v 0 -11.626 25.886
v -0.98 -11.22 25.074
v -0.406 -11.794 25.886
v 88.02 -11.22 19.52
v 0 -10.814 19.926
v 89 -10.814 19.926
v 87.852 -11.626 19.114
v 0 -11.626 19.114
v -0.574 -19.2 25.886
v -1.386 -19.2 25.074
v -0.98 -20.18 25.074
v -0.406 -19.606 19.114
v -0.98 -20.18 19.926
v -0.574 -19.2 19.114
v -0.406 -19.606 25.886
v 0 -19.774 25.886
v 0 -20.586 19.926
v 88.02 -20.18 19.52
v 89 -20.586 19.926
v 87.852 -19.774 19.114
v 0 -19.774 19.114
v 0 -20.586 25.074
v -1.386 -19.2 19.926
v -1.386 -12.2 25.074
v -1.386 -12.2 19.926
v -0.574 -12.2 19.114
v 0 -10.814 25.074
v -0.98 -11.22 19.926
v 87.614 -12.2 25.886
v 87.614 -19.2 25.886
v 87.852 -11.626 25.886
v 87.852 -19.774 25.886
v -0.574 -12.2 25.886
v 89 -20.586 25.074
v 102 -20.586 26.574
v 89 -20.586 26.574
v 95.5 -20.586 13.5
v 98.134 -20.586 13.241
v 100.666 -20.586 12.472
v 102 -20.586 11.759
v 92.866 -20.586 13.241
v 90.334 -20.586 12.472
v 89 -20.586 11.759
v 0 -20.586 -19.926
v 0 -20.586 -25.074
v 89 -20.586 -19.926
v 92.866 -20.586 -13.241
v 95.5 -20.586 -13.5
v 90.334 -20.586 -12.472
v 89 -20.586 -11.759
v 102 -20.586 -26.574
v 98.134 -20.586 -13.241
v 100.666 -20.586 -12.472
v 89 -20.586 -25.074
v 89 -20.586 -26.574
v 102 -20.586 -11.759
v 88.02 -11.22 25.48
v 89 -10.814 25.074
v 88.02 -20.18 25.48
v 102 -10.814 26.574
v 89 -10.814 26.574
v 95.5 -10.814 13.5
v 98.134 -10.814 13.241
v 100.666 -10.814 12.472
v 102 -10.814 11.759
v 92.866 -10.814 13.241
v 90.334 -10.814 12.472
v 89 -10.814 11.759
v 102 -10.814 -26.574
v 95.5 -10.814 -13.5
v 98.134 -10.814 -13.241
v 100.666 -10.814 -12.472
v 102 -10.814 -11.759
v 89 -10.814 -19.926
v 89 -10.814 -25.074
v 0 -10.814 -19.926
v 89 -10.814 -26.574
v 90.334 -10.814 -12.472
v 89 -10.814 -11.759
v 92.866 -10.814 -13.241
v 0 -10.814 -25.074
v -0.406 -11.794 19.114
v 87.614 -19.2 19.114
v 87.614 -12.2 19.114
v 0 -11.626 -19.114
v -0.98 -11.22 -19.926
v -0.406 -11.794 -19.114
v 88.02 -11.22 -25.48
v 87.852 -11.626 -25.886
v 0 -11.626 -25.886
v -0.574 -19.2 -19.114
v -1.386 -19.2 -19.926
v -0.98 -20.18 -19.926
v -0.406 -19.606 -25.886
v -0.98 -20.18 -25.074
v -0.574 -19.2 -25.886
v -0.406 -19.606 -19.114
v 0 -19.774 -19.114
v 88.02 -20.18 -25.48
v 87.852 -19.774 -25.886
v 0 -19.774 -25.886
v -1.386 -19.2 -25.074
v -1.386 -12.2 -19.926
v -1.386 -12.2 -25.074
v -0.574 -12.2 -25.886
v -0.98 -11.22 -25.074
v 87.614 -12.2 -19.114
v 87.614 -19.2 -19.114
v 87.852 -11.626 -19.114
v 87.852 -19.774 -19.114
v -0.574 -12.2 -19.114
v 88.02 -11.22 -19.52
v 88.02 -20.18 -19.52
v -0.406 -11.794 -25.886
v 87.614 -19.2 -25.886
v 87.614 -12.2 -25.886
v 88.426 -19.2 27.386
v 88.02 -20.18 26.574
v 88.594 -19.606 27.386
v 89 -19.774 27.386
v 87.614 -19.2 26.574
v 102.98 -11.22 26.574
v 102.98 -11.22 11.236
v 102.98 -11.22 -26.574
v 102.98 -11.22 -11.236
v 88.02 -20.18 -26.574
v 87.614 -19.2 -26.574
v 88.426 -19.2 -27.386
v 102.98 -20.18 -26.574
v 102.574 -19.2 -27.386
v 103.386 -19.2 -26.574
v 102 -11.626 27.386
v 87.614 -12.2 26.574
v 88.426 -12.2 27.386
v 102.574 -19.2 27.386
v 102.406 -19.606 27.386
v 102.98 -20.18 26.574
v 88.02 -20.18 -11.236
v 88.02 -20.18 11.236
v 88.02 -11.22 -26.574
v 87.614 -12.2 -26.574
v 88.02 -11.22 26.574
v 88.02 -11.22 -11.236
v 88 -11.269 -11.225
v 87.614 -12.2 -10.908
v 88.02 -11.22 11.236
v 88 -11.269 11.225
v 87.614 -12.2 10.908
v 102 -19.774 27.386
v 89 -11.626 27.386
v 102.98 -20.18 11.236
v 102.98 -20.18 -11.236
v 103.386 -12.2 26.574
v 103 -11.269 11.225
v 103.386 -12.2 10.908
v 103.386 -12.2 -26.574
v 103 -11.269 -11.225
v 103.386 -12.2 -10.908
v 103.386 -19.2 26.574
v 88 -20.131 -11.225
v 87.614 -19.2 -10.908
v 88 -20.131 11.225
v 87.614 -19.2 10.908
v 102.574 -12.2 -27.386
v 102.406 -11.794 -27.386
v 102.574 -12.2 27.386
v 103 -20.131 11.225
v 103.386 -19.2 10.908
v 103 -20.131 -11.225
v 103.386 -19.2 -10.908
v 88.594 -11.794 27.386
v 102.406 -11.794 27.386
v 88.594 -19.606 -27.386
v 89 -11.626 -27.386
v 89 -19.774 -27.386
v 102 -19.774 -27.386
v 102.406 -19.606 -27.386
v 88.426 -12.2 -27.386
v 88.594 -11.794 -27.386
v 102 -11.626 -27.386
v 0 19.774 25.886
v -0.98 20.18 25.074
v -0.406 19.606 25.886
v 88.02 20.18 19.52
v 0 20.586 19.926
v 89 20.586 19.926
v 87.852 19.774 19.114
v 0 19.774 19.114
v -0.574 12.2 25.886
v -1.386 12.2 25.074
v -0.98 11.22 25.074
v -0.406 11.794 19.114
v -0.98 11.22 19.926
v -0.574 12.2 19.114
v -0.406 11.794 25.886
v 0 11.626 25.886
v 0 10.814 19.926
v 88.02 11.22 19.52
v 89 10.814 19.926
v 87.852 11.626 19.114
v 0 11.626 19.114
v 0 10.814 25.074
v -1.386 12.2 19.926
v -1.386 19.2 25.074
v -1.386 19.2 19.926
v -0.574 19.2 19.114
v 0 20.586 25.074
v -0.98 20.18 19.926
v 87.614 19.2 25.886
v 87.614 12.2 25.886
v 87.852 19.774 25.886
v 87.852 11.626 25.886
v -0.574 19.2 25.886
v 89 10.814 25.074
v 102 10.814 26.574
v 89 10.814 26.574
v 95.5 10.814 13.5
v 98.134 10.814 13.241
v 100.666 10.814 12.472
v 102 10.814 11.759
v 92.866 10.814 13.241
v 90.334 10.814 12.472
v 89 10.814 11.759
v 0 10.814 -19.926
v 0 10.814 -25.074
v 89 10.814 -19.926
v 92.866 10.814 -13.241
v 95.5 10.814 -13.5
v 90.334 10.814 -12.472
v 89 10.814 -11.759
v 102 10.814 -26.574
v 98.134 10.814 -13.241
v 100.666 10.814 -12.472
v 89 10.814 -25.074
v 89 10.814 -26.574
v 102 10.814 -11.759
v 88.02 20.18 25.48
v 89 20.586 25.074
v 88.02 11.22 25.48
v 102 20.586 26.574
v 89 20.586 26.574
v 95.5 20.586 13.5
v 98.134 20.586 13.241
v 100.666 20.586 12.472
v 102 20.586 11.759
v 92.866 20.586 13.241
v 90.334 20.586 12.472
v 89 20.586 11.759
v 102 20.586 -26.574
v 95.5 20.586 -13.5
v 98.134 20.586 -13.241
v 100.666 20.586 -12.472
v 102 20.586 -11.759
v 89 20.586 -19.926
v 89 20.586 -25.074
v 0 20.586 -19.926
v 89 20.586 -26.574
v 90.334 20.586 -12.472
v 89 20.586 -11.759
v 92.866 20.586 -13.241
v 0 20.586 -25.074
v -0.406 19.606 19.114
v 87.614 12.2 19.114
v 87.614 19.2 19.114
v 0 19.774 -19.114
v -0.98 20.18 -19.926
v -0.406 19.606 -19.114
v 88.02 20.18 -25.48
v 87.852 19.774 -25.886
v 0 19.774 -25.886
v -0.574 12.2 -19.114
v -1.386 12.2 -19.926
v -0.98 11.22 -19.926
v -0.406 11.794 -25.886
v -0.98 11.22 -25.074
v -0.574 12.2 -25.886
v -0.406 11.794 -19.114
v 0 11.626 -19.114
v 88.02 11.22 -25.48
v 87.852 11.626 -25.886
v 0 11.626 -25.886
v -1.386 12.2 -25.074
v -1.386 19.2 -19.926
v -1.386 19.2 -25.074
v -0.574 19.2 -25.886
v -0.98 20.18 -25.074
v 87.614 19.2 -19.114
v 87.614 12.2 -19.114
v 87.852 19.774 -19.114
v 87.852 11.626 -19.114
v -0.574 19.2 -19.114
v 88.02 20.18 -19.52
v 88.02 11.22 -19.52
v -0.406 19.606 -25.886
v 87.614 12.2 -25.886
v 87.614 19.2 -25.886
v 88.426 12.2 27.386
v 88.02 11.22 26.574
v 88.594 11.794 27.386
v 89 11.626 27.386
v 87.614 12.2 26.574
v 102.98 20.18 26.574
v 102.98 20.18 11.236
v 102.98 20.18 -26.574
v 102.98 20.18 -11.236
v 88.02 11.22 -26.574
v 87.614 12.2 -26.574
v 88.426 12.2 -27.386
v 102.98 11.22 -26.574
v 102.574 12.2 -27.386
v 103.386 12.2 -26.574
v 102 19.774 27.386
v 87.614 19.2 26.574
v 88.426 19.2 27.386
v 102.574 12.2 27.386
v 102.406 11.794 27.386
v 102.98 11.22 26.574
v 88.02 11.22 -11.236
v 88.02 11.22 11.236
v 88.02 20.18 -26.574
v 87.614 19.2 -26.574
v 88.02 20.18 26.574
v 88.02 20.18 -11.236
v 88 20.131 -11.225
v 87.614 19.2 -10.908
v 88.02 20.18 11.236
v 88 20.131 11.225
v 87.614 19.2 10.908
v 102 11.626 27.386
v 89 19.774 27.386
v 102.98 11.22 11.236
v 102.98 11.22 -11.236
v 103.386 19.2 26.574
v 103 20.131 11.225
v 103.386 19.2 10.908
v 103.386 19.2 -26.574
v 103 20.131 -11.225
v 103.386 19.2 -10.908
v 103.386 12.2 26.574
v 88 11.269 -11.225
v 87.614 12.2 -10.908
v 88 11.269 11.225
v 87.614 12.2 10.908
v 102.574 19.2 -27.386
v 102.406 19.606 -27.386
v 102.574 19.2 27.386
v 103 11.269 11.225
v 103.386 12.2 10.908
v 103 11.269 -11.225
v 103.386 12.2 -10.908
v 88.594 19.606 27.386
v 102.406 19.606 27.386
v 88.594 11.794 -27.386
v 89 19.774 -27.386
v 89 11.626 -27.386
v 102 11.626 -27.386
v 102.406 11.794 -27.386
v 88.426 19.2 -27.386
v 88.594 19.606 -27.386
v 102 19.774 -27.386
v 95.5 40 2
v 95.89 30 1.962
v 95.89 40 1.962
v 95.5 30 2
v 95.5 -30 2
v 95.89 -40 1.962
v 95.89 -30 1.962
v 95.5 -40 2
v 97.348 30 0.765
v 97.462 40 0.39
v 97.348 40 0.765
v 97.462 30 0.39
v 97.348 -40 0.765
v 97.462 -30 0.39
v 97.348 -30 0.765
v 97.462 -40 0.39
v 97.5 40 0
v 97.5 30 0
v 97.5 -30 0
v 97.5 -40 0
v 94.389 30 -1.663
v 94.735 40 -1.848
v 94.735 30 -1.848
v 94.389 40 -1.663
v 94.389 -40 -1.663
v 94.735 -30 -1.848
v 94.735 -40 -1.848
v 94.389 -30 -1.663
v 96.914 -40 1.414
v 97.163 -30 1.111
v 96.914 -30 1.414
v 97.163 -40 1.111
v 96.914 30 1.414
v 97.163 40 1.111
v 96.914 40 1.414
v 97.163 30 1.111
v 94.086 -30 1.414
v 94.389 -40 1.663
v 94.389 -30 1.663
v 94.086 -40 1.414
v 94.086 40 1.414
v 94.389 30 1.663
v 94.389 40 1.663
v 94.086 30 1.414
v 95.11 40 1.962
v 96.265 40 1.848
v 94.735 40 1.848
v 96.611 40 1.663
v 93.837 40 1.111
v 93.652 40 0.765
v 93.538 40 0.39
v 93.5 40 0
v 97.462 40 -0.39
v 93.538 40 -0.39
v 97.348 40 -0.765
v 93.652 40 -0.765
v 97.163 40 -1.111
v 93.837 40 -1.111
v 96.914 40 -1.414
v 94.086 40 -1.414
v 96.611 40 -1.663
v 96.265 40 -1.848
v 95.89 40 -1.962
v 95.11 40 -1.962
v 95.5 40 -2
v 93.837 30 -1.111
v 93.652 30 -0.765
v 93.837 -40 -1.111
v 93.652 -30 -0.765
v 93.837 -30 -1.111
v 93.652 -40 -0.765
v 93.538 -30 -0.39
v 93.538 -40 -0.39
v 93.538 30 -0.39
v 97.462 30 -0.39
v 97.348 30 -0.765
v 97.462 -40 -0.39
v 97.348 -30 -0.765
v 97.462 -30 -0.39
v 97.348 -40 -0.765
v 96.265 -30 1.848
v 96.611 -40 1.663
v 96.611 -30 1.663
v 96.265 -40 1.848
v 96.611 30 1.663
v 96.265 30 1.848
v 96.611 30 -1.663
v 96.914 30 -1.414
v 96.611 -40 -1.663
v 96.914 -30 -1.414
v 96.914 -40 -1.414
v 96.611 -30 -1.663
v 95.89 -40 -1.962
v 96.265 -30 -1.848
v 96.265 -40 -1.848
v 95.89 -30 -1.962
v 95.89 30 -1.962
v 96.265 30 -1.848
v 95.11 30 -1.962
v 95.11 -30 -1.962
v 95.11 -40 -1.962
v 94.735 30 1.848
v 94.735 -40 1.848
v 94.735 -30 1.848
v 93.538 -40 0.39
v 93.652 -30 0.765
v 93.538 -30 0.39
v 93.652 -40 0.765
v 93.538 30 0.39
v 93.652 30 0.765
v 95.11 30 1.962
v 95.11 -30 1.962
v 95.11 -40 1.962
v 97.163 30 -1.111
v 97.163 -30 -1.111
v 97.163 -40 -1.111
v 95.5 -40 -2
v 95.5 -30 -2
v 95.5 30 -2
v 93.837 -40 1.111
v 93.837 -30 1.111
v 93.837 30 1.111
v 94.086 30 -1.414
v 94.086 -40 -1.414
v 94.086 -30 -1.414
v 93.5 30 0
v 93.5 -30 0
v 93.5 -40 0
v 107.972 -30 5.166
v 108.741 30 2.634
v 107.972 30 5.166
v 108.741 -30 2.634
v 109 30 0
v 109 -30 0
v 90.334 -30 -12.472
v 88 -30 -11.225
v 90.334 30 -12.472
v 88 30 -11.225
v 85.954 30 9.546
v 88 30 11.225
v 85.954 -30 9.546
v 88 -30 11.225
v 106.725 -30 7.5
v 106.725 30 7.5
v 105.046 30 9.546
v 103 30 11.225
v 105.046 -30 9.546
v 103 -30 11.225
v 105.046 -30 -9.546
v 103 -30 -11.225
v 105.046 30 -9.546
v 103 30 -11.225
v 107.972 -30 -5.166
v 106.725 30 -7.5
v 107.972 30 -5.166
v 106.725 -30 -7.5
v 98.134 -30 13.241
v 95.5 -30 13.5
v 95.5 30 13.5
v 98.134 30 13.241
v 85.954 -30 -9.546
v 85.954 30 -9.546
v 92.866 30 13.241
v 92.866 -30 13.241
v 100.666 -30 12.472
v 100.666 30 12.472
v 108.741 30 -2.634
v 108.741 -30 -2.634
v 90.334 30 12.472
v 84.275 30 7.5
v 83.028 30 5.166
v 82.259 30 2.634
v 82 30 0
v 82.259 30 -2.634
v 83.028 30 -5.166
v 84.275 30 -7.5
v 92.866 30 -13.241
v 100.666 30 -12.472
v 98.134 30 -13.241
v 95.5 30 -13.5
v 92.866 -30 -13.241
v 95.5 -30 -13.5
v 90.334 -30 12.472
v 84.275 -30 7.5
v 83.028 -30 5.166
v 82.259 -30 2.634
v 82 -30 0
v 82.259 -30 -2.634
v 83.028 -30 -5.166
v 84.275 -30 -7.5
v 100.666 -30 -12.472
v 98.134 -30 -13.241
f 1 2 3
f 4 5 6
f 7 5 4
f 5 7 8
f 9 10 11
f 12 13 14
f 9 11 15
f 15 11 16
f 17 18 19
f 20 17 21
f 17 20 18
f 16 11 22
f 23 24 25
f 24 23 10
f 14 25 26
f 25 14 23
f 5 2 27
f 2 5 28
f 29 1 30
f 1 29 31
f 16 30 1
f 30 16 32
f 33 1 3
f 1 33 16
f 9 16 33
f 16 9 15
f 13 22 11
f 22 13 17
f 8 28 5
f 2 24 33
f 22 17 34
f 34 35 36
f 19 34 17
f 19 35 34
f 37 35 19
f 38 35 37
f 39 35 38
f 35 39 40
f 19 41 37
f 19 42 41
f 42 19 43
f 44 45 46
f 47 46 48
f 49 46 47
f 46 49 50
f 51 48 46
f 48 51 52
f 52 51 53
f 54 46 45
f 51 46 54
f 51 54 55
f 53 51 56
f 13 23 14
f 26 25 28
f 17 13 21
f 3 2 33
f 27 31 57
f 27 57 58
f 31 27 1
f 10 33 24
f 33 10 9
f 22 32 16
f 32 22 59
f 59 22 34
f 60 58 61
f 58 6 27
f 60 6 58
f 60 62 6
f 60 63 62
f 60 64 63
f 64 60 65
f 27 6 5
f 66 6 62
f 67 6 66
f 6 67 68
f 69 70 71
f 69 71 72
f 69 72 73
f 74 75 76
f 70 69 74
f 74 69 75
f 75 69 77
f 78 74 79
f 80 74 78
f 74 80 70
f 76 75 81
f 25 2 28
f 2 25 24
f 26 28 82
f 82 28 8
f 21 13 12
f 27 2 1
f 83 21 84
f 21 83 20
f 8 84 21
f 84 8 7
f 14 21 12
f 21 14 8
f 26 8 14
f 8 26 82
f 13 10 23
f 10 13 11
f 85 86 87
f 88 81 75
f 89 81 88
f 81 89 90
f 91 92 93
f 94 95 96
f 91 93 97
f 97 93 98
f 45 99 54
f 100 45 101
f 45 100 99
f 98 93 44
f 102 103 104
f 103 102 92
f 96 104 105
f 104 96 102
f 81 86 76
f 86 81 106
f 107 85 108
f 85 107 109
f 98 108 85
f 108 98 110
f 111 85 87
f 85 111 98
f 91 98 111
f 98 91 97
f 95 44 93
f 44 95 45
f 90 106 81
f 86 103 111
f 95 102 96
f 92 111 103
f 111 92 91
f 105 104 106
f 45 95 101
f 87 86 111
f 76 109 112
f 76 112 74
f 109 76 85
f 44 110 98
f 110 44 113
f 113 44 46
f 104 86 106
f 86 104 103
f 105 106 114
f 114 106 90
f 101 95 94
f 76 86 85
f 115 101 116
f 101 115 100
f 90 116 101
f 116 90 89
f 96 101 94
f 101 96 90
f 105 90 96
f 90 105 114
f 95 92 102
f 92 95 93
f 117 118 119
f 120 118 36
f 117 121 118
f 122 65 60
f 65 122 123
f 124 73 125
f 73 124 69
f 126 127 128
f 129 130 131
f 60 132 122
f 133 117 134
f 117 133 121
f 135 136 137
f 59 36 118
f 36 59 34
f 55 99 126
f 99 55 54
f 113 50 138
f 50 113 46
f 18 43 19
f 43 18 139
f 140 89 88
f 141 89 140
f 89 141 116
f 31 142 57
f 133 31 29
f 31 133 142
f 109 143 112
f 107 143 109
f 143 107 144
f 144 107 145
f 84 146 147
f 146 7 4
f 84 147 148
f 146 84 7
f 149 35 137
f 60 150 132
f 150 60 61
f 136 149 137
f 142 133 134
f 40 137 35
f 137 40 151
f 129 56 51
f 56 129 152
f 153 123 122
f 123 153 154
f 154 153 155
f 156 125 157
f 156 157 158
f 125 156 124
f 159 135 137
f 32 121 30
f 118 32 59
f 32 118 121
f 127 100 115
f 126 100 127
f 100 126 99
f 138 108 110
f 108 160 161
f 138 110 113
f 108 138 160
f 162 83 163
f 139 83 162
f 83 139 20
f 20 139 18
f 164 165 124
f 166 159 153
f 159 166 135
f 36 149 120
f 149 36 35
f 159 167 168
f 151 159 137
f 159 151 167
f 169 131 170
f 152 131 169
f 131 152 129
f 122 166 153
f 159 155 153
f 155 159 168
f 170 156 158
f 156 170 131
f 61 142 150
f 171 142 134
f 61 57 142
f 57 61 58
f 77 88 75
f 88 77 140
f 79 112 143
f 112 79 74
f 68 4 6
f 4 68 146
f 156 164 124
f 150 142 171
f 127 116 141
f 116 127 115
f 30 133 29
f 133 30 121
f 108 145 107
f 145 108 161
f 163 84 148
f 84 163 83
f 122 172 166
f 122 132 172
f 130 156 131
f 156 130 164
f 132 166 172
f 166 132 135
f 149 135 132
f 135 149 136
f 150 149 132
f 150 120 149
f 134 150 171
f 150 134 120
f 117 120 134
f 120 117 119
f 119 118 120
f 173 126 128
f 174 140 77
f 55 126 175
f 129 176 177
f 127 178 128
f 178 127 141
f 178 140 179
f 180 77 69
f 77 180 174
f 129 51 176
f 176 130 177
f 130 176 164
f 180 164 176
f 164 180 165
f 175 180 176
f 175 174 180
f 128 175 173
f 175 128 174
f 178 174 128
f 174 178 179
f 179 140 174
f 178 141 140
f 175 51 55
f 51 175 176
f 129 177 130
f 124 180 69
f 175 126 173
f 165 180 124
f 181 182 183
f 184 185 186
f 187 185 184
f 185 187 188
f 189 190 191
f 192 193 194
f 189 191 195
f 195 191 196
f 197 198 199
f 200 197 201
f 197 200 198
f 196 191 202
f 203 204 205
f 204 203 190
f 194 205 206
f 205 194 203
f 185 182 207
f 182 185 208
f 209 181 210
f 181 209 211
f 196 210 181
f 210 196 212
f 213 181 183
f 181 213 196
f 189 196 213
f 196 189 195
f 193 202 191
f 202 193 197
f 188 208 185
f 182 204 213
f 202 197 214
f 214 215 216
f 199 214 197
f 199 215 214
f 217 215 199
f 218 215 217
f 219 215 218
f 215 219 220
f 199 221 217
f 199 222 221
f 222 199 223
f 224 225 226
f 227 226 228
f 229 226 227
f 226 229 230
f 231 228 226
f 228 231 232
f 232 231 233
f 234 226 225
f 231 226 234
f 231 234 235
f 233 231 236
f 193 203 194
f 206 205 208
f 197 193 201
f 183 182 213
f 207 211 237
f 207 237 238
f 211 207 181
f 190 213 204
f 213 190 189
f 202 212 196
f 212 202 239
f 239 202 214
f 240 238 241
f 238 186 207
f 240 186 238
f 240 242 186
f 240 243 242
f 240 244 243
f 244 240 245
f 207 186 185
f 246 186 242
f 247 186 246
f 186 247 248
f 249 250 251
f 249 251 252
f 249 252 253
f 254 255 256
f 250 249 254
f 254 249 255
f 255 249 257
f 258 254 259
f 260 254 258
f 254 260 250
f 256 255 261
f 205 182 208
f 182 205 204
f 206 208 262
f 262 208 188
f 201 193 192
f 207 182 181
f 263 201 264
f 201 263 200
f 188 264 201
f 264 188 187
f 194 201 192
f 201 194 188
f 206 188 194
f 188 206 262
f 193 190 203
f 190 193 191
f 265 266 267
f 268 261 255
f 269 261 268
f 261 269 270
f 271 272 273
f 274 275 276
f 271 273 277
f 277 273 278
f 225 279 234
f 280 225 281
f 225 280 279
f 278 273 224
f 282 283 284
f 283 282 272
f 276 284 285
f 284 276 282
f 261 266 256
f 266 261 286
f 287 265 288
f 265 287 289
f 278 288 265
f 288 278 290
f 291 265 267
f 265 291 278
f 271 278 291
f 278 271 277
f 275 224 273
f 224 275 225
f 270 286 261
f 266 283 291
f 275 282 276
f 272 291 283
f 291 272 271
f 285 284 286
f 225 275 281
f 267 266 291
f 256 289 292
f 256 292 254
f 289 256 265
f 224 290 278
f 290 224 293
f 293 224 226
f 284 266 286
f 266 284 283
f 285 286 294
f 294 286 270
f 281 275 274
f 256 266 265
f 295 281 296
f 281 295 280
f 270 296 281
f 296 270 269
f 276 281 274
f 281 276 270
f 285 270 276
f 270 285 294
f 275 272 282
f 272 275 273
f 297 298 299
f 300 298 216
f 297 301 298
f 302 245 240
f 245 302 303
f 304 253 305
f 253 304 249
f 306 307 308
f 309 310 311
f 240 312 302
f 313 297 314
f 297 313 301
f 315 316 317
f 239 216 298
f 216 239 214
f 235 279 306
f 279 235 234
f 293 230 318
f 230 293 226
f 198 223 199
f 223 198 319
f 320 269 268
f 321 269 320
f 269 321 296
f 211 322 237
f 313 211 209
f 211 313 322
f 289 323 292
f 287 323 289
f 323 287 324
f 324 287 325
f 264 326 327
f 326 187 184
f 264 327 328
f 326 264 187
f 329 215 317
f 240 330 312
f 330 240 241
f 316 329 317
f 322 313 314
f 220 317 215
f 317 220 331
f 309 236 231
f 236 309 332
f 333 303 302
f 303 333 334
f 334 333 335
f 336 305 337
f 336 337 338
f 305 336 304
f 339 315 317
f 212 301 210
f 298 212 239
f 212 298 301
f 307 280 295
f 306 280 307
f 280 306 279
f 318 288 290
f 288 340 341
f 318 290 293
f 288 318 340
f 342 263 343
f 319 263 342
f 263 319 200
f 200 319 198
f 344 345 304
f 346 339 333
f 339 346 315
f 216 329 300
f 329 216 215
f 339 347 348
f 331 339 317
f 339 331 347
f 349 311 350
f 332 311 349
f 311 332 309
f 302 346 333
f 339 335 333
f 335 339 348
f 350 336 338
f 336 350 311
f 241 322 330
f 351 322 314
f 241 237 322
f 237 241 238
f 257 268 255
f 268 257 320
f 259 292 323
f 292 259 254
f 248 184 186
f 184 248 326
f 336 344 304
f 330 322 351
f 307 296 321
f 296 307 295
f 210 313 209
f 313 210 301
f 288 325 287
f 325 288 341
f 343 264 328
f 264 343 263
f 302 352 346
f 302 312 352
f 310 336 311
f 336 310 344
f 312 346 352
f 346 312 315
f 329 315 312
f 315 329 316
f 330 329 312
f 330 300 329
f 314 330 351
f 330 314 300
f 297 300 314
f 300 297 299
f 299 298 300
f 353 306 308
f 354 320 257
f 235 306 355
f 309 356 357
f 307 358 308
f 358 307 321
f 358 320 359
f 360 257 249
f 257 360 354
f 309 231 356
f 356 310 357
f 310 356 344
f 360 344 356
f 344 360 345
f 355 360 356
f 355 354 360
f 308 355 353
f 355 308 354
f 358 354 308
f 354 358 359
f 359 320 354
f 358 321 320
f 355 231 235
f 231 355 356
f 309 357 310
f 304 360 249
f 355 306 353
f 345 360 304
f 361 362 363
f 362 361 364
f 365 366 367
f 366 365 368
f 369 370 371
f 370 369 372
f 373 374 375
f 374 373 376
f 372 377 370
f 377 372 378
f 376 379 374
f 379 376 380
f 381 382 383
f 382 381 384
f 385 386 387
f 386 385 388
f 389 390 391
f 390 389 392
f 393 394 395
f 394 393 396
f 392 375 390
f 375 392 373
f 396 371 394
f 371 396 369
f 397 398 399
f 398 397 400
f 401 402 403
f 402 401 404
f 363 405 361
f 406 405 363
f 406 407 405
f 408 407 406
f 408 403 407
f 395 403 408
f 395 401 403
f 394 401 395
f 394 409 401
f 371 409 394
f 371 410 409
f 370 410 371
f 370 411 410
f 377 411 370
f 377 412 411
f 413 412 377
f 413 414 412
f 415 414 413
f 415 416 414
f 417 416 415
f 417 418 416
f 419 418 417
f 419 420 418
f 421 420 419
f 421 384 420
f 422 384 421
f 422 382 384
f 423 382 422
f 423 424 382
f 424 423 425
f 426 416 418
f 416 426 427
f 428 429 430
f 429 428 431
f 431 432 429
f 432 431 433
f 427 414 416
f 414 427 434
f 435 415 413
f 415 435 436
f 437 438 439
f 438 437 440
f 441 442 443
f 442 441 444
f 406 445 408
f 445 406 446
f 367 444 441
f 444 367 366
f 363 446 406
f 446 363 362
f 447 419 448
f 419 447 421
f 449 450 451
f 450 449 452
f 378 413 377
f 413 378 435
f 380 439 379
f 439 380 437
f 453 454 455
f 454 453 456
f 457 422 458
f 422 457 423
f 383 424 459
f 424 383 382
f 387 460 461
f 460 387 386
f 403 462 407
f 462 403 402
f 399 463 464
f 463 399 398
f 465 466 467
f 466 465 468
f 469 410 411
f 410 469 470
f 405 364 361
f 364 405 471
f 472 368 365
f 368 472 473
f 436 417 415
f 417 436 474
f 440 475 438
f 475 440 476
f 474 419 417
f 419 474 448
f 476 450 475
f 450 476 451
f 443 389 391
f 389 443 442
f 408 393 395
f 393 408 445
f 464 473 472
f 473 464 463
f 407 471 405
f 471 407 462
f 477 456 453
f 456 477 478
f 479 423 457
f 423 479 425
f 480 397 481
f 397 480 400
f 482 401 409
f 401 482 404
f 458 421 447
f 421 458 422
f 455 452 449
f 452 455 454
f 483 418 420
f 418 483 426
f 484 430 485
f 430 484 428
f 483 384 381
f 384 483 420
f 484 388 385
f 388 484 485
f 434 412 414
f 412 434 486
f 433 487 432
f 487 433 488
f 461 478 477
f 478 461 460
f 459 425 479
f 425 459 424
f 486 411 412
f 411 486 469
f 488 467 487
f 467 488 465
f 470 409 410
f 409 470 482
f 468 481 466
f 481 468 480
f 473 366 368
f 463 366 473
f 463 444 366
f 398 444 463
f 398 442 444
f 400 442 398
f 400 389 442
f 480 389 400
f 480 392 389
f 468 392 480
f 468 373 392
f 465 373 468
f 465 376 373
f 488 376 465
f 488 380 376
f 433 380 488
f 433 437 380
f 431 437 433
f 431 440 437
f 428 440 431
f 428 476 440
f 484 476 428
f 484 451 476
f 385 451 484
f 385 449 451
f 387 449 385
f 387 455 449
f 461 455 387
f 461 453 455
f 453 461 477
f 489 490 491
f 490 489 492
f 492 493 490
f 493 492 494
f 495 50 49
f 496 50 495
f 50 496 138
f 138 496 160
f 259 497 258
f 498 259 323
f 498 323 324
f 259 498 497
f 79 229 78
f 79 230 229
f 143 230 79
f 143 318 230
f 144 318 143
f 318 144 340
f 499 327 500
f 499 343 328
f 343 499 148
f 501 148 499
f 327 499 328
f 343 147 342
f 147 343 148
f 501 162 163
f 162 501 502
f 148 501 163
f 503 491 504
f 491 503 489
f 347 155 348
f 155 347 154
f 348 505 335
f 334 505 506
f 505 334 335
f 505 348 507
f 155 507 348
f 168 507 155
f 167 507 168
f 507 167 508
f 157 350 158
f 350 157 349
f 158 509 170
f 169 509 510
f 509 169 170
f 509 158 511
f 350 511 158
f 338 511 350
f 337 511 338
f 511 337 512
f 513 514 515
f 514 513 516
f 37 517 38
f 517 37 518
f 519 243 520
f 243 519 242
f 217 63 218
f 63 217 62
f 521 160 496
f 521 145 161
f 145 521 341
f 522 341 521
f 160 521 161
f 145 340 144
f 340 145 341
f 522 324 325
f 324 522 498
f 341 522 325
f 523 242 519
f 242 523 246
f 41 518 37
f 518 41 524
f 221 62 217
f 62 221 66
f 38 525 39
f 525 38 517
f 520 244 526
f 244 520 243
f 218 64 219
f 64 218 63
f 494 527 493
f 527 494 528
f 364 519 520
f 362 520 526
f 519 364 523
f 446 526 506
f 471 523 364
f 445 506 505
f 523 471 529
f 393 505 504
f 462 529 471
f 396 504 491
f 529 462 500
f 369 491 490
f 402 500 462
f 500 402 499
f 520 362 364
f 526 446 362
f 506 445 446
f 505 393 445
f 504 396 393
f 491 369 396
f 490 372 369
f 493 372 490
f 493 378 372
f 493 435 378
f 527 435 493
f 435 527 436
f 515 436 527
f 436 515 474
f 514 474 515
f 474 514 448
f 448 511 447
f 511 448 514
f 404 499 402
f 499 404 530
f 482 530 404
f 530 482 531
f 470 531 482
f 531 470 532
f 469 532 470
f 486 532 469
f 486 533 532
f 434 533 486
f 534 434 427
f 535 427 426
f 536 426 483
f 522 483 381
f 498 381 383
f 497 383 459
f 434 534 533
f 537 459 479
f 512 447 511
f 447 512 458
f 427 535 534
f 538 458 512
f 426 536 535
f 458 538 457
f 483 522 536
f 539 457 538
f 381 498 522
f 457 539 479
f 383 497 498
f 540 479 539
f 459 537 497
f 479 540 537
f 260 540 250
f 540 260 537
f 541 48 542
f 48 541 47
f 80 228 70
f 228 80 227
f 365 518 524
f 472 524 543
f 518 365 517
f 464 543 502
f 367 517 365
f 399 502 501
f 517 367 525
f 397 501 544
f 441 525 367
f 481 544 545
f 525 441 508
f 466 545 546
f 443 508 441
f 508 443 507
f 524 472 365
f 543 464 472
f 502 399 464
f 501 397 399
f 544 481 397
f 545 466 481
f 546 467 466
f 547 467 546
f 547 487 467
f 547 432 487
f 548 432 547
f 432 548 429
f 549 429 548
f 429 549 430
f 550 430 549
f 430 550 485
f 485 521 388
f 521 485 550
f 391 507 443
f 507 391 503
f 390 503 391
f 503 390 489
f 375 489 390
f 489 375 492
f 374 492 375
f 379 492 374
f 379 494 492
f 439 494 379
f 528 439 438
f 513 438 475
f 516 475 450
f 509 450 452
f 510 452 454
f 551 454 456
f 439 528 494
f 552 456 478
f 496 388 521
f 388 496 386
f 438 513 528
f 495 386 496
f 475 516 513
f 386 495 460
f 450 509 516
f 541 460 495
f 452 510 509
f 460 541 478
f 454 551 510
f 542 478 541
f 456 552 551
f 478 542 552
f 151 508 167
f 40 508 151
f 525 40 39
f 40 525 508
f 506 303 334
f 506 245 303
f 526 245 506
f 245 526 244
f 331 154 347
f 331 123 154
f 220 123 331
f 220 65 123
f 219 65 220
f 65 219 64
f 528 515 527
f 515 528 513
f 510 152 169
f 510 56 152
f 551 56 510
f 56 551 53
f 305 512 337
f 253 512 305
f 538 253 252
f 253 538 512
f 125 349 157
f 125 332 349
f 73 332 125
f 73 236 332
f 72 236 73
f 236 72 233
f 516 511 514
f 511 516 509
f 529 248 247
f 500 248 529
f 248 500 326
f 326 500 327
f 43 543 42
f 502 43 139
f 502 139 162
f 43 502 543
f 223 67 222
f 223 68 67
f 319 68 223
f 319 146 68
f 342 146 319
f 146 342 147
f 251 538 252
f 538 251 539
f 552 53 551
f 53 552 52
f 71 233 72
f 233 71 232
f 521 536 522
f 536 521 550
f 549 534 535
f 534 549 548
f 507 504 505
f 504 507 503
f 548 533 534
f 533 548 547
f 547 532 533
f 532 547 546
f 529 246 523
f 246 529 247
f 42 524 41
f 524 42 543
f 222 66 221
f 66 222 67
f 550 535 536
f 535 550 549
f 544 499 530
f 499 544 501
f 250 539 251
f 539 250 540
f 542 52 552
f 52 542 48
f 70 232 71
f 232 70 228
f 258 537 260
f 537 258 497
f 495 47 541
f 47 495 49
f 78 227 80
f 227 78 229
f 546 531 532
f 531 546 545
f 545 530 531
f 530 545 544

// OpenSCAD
// =========================================================
// CARRIER TEST — C-channel arms with solid bridge block
// =========================================================
// One corridor = two C-shaped members facing each other.
// Each C-member: upper arm → solid bridge block → lower arm.
// The bridge is one continuous block from upper arm outer face
// to lower arm outer face. Bearing housing is part of the block.
// No gussets — one clean solid.
// =========================================================

$fn = 32;

// =============================================
// PARAMETERS
// =============================================

// Arm cross-section
ARM_W       = 10;     // width (along shaft axis / Y)
ARM_H       = 7;      // height (vertical / Z)
ARM_CHAMFER = 1.5;

// Tier Z positions
UPPER_Z     = 22.5;
LOWER_Z     = -22.5;
HELIX_Z     = 0;

// Bearing — MR84ZZ
BRG_OD      = 8.0;
BRG_ID      = 4.0;
BRG_W       = 3.0;
BRG_BORE    = 8.15;

// Corridor
CORRIDOR_GAP = 31.4;
ARM_LENGTH   = 100;

// Shaft
SHAFT_DIA    = 4.0;
SHAFT_LEN    = 80;

// Bridge block — one solid piece
// Width (Y) = ARM_W (flush with arms)
// Height (Z) = upper arm outer face to lower arm outer face
// Depth (X) = enough to house bearing with wall all around
HOUSING_WALL  = 4.0;
BRIDGE_D      = BRG_OD + HOUSING_WALL * 2;   // 16mm depth along X
BRIDGE_Z_TOP  = UPPER_Z + ARM_H / 2;         // upper arm outer face
BRIDGE_Z_BOT  = LOWER_Z - ARM_H / 2;         // lower arm outer face
BRIDGE_H      = BRIDGE_Z_TOP - BRIDGE_Z_BOT; // full span

// =============================================
// COLORS
// =============================================
C_ARM     = [0.9, 0.4, 0.9, 0.9];
C_BEARING = [0.5, 0.5, 0.55, 0.8];
C_SHAFT   = [0.7, 0.7, 0.75, 0.9];
C_GHOST   = [0.3, 0.6, 0.9, 0.15];

// =============================================
// DISPLAY TOGGLES
// =============================================
SHOW_SHAFT     = true;
SHOW_BEARING   = true;
SHOW_GHOST_CAM = true;

// =============================================
// ASSEMBLY
// =============================================

// Left C-member
translate([0, -CORRIDOR_GAP/2, 0])
    c_member();

// Right C-member
translate([0, CORRIDOR_GAP/2, 0])
    c_member();

// Bridge center X (housing bore center)
_BRG_CX = ARM_LENGTH - (BRIDGE_D - ARM_H) / 2;

// Shaft
if (SHOW_SHAFT)
    color(C_SHAFT)
    translate([_BRG_CX, 0, HELIX_Z])
        rotate([90, 0, 0])
            cylinder(d=SHAFT_DIA, h=SHAFT_LEN, center=true);

// Bearings
if (SHOW_BEARING)
    for (y_sign = [-1, 1])
        color(C_BEARING)
        translate([_BRG_CX, y_sign * CORRIDOR_GAP/2, HELIX_Z])
            rotate([90, 0, 0])
                difference() {
                    cylinder(d=BRG_OD, h=BRG_W, center=true);
                    cylinder(d=BRG_ID, h=BRG_W+1, center=true);
                }

// Ghost cam
if (SHOW_GHOST_CAM)
    color(C_GHOST)
    translate([_BRG_CX, 0, HELIX_Z])
        rotate([90, 0, 0])
            cylinder(d=27, h=60, center=true);


// =============================================
// C-MEMBER: upper arm → bridge block → lower arm
// =============================================
module c_member() {
    // Bridge block X span
    _bx_inner = ARM_LENGTH - BRIDGE_D + ARM_H/2;  // inboard face
    _bx_outer = ARM_LENGTH + ARM_H/2;              // outboard face (flush with arm tip)

    color(C_ARM)
    difference() {
        union() {
            // === UPPER ARM ===
            _arm_bar([0, 0, UPPER_Z], [ARM_LENGTH, 0, UPPER_Z]);

            // === LOWER ARM ===
            _arm_bar([0, 0, LOWER_Z], [ARM_LENGTH, 0, LOWER_Z]);

            // === BRIDGE BLOCK — one continuous solid ===
            // BRIDGE_D deep (X), ARM_W wide (Y), full tier height (Z).
            // Centered so outer face aligns with arm end.
            _bridge_block();
        }

        // === BEARING BORE — through-hole ===
        translate([_BRG_CX, 0, HELIX_Z])
            rotate([90, 0, 0])
                cylinder(d=BRG_BORE, h=ARM_W + 4, center=true);

        // === SHAFT CLEARANCE ===
        translate([_BRG_CX, 0, HELIX_Z])
            rotate([90, 0, 0])
                cylinder(d=SHAFT_DIA + 1, h=200, center=true);
    }
}


// =============================================
// BRIDGE BLOCK — one solid from top to bottom
// =============================================
module _bridge_block() {
    _cx = ARM_LENGTH - (BRIDGE_D - ARM_H) / 2;
    _c = ARM_CHAMFER;

    // One hull from top to bottom — simple chamfered box
    hull() {
        translate([_cx, 0, BRIDGE_Z_TOP])
            _block_profile();
        translate([_cx, 0, BRIDGE_Z_BOT])
            _block_profile();
    }
}

// Block cross-section: BRIDGE_D along X, ARM_W along Y
module _block_profile() {
    _c = ARM_CHAMFER;
    if (_c > 0.2 && BRIDGE_D > 2*_c && ARM_W > 2*_c) {
        hull()
        for (x = [-BRIDGE_D/2 + _c, BRIDGE_D/2 - _c])
            for (y = [-ARM_W/2 + _c, ARM_W/2 - _c])
                translate([x, y, 0])
                    sphere(r = _c, $fn = 8);
    } else {
        cube([BRIDGE_D, ARM_W, 0.01], center=true);
    }
}


// =============================================
// ARM BAR — horizontal arm run
// =============================================
module _arm_bar(p1, p2) {
    _segs = 8;
    for (i = [0 : _segs - 1]) {
        t0 = i / _segs;
        t1 = (i + 1) / _segs;
        _p0 = [p1[0]+(p2[0]-p1[0])*t0, p1[1], p1[2]];
        _p1 = [p1[0]+(p2[0]-p1[0])*t1, p1[1], p1[2]];
        hull() {
            translate(_p0) _profile_yz();
            translate(_p1) _profile_yz();
        }
    }
}


// =============================================
// PROFILES
// =============================================

// Arm profile in YZ plane (horizontal arms along X)
module _profile_yz() {
    _c = ARM_CHAMFER;
    if (_c > 0.2 && ARM_W > 2*_c && ARM_H > 2*_c) {
        hull()
        for (y = [-ARM_W/2 + _c, ARM_W/2 - _c])
            for (z = [-ARM_H/2 + _c, ARM_H/2 - _c])
                translate([0, y, z])
                    sphere(r = _c, $fn = 8);
    } else {
        cube([0.01, ARM_W, ARM_H], center=true);
    }
}
